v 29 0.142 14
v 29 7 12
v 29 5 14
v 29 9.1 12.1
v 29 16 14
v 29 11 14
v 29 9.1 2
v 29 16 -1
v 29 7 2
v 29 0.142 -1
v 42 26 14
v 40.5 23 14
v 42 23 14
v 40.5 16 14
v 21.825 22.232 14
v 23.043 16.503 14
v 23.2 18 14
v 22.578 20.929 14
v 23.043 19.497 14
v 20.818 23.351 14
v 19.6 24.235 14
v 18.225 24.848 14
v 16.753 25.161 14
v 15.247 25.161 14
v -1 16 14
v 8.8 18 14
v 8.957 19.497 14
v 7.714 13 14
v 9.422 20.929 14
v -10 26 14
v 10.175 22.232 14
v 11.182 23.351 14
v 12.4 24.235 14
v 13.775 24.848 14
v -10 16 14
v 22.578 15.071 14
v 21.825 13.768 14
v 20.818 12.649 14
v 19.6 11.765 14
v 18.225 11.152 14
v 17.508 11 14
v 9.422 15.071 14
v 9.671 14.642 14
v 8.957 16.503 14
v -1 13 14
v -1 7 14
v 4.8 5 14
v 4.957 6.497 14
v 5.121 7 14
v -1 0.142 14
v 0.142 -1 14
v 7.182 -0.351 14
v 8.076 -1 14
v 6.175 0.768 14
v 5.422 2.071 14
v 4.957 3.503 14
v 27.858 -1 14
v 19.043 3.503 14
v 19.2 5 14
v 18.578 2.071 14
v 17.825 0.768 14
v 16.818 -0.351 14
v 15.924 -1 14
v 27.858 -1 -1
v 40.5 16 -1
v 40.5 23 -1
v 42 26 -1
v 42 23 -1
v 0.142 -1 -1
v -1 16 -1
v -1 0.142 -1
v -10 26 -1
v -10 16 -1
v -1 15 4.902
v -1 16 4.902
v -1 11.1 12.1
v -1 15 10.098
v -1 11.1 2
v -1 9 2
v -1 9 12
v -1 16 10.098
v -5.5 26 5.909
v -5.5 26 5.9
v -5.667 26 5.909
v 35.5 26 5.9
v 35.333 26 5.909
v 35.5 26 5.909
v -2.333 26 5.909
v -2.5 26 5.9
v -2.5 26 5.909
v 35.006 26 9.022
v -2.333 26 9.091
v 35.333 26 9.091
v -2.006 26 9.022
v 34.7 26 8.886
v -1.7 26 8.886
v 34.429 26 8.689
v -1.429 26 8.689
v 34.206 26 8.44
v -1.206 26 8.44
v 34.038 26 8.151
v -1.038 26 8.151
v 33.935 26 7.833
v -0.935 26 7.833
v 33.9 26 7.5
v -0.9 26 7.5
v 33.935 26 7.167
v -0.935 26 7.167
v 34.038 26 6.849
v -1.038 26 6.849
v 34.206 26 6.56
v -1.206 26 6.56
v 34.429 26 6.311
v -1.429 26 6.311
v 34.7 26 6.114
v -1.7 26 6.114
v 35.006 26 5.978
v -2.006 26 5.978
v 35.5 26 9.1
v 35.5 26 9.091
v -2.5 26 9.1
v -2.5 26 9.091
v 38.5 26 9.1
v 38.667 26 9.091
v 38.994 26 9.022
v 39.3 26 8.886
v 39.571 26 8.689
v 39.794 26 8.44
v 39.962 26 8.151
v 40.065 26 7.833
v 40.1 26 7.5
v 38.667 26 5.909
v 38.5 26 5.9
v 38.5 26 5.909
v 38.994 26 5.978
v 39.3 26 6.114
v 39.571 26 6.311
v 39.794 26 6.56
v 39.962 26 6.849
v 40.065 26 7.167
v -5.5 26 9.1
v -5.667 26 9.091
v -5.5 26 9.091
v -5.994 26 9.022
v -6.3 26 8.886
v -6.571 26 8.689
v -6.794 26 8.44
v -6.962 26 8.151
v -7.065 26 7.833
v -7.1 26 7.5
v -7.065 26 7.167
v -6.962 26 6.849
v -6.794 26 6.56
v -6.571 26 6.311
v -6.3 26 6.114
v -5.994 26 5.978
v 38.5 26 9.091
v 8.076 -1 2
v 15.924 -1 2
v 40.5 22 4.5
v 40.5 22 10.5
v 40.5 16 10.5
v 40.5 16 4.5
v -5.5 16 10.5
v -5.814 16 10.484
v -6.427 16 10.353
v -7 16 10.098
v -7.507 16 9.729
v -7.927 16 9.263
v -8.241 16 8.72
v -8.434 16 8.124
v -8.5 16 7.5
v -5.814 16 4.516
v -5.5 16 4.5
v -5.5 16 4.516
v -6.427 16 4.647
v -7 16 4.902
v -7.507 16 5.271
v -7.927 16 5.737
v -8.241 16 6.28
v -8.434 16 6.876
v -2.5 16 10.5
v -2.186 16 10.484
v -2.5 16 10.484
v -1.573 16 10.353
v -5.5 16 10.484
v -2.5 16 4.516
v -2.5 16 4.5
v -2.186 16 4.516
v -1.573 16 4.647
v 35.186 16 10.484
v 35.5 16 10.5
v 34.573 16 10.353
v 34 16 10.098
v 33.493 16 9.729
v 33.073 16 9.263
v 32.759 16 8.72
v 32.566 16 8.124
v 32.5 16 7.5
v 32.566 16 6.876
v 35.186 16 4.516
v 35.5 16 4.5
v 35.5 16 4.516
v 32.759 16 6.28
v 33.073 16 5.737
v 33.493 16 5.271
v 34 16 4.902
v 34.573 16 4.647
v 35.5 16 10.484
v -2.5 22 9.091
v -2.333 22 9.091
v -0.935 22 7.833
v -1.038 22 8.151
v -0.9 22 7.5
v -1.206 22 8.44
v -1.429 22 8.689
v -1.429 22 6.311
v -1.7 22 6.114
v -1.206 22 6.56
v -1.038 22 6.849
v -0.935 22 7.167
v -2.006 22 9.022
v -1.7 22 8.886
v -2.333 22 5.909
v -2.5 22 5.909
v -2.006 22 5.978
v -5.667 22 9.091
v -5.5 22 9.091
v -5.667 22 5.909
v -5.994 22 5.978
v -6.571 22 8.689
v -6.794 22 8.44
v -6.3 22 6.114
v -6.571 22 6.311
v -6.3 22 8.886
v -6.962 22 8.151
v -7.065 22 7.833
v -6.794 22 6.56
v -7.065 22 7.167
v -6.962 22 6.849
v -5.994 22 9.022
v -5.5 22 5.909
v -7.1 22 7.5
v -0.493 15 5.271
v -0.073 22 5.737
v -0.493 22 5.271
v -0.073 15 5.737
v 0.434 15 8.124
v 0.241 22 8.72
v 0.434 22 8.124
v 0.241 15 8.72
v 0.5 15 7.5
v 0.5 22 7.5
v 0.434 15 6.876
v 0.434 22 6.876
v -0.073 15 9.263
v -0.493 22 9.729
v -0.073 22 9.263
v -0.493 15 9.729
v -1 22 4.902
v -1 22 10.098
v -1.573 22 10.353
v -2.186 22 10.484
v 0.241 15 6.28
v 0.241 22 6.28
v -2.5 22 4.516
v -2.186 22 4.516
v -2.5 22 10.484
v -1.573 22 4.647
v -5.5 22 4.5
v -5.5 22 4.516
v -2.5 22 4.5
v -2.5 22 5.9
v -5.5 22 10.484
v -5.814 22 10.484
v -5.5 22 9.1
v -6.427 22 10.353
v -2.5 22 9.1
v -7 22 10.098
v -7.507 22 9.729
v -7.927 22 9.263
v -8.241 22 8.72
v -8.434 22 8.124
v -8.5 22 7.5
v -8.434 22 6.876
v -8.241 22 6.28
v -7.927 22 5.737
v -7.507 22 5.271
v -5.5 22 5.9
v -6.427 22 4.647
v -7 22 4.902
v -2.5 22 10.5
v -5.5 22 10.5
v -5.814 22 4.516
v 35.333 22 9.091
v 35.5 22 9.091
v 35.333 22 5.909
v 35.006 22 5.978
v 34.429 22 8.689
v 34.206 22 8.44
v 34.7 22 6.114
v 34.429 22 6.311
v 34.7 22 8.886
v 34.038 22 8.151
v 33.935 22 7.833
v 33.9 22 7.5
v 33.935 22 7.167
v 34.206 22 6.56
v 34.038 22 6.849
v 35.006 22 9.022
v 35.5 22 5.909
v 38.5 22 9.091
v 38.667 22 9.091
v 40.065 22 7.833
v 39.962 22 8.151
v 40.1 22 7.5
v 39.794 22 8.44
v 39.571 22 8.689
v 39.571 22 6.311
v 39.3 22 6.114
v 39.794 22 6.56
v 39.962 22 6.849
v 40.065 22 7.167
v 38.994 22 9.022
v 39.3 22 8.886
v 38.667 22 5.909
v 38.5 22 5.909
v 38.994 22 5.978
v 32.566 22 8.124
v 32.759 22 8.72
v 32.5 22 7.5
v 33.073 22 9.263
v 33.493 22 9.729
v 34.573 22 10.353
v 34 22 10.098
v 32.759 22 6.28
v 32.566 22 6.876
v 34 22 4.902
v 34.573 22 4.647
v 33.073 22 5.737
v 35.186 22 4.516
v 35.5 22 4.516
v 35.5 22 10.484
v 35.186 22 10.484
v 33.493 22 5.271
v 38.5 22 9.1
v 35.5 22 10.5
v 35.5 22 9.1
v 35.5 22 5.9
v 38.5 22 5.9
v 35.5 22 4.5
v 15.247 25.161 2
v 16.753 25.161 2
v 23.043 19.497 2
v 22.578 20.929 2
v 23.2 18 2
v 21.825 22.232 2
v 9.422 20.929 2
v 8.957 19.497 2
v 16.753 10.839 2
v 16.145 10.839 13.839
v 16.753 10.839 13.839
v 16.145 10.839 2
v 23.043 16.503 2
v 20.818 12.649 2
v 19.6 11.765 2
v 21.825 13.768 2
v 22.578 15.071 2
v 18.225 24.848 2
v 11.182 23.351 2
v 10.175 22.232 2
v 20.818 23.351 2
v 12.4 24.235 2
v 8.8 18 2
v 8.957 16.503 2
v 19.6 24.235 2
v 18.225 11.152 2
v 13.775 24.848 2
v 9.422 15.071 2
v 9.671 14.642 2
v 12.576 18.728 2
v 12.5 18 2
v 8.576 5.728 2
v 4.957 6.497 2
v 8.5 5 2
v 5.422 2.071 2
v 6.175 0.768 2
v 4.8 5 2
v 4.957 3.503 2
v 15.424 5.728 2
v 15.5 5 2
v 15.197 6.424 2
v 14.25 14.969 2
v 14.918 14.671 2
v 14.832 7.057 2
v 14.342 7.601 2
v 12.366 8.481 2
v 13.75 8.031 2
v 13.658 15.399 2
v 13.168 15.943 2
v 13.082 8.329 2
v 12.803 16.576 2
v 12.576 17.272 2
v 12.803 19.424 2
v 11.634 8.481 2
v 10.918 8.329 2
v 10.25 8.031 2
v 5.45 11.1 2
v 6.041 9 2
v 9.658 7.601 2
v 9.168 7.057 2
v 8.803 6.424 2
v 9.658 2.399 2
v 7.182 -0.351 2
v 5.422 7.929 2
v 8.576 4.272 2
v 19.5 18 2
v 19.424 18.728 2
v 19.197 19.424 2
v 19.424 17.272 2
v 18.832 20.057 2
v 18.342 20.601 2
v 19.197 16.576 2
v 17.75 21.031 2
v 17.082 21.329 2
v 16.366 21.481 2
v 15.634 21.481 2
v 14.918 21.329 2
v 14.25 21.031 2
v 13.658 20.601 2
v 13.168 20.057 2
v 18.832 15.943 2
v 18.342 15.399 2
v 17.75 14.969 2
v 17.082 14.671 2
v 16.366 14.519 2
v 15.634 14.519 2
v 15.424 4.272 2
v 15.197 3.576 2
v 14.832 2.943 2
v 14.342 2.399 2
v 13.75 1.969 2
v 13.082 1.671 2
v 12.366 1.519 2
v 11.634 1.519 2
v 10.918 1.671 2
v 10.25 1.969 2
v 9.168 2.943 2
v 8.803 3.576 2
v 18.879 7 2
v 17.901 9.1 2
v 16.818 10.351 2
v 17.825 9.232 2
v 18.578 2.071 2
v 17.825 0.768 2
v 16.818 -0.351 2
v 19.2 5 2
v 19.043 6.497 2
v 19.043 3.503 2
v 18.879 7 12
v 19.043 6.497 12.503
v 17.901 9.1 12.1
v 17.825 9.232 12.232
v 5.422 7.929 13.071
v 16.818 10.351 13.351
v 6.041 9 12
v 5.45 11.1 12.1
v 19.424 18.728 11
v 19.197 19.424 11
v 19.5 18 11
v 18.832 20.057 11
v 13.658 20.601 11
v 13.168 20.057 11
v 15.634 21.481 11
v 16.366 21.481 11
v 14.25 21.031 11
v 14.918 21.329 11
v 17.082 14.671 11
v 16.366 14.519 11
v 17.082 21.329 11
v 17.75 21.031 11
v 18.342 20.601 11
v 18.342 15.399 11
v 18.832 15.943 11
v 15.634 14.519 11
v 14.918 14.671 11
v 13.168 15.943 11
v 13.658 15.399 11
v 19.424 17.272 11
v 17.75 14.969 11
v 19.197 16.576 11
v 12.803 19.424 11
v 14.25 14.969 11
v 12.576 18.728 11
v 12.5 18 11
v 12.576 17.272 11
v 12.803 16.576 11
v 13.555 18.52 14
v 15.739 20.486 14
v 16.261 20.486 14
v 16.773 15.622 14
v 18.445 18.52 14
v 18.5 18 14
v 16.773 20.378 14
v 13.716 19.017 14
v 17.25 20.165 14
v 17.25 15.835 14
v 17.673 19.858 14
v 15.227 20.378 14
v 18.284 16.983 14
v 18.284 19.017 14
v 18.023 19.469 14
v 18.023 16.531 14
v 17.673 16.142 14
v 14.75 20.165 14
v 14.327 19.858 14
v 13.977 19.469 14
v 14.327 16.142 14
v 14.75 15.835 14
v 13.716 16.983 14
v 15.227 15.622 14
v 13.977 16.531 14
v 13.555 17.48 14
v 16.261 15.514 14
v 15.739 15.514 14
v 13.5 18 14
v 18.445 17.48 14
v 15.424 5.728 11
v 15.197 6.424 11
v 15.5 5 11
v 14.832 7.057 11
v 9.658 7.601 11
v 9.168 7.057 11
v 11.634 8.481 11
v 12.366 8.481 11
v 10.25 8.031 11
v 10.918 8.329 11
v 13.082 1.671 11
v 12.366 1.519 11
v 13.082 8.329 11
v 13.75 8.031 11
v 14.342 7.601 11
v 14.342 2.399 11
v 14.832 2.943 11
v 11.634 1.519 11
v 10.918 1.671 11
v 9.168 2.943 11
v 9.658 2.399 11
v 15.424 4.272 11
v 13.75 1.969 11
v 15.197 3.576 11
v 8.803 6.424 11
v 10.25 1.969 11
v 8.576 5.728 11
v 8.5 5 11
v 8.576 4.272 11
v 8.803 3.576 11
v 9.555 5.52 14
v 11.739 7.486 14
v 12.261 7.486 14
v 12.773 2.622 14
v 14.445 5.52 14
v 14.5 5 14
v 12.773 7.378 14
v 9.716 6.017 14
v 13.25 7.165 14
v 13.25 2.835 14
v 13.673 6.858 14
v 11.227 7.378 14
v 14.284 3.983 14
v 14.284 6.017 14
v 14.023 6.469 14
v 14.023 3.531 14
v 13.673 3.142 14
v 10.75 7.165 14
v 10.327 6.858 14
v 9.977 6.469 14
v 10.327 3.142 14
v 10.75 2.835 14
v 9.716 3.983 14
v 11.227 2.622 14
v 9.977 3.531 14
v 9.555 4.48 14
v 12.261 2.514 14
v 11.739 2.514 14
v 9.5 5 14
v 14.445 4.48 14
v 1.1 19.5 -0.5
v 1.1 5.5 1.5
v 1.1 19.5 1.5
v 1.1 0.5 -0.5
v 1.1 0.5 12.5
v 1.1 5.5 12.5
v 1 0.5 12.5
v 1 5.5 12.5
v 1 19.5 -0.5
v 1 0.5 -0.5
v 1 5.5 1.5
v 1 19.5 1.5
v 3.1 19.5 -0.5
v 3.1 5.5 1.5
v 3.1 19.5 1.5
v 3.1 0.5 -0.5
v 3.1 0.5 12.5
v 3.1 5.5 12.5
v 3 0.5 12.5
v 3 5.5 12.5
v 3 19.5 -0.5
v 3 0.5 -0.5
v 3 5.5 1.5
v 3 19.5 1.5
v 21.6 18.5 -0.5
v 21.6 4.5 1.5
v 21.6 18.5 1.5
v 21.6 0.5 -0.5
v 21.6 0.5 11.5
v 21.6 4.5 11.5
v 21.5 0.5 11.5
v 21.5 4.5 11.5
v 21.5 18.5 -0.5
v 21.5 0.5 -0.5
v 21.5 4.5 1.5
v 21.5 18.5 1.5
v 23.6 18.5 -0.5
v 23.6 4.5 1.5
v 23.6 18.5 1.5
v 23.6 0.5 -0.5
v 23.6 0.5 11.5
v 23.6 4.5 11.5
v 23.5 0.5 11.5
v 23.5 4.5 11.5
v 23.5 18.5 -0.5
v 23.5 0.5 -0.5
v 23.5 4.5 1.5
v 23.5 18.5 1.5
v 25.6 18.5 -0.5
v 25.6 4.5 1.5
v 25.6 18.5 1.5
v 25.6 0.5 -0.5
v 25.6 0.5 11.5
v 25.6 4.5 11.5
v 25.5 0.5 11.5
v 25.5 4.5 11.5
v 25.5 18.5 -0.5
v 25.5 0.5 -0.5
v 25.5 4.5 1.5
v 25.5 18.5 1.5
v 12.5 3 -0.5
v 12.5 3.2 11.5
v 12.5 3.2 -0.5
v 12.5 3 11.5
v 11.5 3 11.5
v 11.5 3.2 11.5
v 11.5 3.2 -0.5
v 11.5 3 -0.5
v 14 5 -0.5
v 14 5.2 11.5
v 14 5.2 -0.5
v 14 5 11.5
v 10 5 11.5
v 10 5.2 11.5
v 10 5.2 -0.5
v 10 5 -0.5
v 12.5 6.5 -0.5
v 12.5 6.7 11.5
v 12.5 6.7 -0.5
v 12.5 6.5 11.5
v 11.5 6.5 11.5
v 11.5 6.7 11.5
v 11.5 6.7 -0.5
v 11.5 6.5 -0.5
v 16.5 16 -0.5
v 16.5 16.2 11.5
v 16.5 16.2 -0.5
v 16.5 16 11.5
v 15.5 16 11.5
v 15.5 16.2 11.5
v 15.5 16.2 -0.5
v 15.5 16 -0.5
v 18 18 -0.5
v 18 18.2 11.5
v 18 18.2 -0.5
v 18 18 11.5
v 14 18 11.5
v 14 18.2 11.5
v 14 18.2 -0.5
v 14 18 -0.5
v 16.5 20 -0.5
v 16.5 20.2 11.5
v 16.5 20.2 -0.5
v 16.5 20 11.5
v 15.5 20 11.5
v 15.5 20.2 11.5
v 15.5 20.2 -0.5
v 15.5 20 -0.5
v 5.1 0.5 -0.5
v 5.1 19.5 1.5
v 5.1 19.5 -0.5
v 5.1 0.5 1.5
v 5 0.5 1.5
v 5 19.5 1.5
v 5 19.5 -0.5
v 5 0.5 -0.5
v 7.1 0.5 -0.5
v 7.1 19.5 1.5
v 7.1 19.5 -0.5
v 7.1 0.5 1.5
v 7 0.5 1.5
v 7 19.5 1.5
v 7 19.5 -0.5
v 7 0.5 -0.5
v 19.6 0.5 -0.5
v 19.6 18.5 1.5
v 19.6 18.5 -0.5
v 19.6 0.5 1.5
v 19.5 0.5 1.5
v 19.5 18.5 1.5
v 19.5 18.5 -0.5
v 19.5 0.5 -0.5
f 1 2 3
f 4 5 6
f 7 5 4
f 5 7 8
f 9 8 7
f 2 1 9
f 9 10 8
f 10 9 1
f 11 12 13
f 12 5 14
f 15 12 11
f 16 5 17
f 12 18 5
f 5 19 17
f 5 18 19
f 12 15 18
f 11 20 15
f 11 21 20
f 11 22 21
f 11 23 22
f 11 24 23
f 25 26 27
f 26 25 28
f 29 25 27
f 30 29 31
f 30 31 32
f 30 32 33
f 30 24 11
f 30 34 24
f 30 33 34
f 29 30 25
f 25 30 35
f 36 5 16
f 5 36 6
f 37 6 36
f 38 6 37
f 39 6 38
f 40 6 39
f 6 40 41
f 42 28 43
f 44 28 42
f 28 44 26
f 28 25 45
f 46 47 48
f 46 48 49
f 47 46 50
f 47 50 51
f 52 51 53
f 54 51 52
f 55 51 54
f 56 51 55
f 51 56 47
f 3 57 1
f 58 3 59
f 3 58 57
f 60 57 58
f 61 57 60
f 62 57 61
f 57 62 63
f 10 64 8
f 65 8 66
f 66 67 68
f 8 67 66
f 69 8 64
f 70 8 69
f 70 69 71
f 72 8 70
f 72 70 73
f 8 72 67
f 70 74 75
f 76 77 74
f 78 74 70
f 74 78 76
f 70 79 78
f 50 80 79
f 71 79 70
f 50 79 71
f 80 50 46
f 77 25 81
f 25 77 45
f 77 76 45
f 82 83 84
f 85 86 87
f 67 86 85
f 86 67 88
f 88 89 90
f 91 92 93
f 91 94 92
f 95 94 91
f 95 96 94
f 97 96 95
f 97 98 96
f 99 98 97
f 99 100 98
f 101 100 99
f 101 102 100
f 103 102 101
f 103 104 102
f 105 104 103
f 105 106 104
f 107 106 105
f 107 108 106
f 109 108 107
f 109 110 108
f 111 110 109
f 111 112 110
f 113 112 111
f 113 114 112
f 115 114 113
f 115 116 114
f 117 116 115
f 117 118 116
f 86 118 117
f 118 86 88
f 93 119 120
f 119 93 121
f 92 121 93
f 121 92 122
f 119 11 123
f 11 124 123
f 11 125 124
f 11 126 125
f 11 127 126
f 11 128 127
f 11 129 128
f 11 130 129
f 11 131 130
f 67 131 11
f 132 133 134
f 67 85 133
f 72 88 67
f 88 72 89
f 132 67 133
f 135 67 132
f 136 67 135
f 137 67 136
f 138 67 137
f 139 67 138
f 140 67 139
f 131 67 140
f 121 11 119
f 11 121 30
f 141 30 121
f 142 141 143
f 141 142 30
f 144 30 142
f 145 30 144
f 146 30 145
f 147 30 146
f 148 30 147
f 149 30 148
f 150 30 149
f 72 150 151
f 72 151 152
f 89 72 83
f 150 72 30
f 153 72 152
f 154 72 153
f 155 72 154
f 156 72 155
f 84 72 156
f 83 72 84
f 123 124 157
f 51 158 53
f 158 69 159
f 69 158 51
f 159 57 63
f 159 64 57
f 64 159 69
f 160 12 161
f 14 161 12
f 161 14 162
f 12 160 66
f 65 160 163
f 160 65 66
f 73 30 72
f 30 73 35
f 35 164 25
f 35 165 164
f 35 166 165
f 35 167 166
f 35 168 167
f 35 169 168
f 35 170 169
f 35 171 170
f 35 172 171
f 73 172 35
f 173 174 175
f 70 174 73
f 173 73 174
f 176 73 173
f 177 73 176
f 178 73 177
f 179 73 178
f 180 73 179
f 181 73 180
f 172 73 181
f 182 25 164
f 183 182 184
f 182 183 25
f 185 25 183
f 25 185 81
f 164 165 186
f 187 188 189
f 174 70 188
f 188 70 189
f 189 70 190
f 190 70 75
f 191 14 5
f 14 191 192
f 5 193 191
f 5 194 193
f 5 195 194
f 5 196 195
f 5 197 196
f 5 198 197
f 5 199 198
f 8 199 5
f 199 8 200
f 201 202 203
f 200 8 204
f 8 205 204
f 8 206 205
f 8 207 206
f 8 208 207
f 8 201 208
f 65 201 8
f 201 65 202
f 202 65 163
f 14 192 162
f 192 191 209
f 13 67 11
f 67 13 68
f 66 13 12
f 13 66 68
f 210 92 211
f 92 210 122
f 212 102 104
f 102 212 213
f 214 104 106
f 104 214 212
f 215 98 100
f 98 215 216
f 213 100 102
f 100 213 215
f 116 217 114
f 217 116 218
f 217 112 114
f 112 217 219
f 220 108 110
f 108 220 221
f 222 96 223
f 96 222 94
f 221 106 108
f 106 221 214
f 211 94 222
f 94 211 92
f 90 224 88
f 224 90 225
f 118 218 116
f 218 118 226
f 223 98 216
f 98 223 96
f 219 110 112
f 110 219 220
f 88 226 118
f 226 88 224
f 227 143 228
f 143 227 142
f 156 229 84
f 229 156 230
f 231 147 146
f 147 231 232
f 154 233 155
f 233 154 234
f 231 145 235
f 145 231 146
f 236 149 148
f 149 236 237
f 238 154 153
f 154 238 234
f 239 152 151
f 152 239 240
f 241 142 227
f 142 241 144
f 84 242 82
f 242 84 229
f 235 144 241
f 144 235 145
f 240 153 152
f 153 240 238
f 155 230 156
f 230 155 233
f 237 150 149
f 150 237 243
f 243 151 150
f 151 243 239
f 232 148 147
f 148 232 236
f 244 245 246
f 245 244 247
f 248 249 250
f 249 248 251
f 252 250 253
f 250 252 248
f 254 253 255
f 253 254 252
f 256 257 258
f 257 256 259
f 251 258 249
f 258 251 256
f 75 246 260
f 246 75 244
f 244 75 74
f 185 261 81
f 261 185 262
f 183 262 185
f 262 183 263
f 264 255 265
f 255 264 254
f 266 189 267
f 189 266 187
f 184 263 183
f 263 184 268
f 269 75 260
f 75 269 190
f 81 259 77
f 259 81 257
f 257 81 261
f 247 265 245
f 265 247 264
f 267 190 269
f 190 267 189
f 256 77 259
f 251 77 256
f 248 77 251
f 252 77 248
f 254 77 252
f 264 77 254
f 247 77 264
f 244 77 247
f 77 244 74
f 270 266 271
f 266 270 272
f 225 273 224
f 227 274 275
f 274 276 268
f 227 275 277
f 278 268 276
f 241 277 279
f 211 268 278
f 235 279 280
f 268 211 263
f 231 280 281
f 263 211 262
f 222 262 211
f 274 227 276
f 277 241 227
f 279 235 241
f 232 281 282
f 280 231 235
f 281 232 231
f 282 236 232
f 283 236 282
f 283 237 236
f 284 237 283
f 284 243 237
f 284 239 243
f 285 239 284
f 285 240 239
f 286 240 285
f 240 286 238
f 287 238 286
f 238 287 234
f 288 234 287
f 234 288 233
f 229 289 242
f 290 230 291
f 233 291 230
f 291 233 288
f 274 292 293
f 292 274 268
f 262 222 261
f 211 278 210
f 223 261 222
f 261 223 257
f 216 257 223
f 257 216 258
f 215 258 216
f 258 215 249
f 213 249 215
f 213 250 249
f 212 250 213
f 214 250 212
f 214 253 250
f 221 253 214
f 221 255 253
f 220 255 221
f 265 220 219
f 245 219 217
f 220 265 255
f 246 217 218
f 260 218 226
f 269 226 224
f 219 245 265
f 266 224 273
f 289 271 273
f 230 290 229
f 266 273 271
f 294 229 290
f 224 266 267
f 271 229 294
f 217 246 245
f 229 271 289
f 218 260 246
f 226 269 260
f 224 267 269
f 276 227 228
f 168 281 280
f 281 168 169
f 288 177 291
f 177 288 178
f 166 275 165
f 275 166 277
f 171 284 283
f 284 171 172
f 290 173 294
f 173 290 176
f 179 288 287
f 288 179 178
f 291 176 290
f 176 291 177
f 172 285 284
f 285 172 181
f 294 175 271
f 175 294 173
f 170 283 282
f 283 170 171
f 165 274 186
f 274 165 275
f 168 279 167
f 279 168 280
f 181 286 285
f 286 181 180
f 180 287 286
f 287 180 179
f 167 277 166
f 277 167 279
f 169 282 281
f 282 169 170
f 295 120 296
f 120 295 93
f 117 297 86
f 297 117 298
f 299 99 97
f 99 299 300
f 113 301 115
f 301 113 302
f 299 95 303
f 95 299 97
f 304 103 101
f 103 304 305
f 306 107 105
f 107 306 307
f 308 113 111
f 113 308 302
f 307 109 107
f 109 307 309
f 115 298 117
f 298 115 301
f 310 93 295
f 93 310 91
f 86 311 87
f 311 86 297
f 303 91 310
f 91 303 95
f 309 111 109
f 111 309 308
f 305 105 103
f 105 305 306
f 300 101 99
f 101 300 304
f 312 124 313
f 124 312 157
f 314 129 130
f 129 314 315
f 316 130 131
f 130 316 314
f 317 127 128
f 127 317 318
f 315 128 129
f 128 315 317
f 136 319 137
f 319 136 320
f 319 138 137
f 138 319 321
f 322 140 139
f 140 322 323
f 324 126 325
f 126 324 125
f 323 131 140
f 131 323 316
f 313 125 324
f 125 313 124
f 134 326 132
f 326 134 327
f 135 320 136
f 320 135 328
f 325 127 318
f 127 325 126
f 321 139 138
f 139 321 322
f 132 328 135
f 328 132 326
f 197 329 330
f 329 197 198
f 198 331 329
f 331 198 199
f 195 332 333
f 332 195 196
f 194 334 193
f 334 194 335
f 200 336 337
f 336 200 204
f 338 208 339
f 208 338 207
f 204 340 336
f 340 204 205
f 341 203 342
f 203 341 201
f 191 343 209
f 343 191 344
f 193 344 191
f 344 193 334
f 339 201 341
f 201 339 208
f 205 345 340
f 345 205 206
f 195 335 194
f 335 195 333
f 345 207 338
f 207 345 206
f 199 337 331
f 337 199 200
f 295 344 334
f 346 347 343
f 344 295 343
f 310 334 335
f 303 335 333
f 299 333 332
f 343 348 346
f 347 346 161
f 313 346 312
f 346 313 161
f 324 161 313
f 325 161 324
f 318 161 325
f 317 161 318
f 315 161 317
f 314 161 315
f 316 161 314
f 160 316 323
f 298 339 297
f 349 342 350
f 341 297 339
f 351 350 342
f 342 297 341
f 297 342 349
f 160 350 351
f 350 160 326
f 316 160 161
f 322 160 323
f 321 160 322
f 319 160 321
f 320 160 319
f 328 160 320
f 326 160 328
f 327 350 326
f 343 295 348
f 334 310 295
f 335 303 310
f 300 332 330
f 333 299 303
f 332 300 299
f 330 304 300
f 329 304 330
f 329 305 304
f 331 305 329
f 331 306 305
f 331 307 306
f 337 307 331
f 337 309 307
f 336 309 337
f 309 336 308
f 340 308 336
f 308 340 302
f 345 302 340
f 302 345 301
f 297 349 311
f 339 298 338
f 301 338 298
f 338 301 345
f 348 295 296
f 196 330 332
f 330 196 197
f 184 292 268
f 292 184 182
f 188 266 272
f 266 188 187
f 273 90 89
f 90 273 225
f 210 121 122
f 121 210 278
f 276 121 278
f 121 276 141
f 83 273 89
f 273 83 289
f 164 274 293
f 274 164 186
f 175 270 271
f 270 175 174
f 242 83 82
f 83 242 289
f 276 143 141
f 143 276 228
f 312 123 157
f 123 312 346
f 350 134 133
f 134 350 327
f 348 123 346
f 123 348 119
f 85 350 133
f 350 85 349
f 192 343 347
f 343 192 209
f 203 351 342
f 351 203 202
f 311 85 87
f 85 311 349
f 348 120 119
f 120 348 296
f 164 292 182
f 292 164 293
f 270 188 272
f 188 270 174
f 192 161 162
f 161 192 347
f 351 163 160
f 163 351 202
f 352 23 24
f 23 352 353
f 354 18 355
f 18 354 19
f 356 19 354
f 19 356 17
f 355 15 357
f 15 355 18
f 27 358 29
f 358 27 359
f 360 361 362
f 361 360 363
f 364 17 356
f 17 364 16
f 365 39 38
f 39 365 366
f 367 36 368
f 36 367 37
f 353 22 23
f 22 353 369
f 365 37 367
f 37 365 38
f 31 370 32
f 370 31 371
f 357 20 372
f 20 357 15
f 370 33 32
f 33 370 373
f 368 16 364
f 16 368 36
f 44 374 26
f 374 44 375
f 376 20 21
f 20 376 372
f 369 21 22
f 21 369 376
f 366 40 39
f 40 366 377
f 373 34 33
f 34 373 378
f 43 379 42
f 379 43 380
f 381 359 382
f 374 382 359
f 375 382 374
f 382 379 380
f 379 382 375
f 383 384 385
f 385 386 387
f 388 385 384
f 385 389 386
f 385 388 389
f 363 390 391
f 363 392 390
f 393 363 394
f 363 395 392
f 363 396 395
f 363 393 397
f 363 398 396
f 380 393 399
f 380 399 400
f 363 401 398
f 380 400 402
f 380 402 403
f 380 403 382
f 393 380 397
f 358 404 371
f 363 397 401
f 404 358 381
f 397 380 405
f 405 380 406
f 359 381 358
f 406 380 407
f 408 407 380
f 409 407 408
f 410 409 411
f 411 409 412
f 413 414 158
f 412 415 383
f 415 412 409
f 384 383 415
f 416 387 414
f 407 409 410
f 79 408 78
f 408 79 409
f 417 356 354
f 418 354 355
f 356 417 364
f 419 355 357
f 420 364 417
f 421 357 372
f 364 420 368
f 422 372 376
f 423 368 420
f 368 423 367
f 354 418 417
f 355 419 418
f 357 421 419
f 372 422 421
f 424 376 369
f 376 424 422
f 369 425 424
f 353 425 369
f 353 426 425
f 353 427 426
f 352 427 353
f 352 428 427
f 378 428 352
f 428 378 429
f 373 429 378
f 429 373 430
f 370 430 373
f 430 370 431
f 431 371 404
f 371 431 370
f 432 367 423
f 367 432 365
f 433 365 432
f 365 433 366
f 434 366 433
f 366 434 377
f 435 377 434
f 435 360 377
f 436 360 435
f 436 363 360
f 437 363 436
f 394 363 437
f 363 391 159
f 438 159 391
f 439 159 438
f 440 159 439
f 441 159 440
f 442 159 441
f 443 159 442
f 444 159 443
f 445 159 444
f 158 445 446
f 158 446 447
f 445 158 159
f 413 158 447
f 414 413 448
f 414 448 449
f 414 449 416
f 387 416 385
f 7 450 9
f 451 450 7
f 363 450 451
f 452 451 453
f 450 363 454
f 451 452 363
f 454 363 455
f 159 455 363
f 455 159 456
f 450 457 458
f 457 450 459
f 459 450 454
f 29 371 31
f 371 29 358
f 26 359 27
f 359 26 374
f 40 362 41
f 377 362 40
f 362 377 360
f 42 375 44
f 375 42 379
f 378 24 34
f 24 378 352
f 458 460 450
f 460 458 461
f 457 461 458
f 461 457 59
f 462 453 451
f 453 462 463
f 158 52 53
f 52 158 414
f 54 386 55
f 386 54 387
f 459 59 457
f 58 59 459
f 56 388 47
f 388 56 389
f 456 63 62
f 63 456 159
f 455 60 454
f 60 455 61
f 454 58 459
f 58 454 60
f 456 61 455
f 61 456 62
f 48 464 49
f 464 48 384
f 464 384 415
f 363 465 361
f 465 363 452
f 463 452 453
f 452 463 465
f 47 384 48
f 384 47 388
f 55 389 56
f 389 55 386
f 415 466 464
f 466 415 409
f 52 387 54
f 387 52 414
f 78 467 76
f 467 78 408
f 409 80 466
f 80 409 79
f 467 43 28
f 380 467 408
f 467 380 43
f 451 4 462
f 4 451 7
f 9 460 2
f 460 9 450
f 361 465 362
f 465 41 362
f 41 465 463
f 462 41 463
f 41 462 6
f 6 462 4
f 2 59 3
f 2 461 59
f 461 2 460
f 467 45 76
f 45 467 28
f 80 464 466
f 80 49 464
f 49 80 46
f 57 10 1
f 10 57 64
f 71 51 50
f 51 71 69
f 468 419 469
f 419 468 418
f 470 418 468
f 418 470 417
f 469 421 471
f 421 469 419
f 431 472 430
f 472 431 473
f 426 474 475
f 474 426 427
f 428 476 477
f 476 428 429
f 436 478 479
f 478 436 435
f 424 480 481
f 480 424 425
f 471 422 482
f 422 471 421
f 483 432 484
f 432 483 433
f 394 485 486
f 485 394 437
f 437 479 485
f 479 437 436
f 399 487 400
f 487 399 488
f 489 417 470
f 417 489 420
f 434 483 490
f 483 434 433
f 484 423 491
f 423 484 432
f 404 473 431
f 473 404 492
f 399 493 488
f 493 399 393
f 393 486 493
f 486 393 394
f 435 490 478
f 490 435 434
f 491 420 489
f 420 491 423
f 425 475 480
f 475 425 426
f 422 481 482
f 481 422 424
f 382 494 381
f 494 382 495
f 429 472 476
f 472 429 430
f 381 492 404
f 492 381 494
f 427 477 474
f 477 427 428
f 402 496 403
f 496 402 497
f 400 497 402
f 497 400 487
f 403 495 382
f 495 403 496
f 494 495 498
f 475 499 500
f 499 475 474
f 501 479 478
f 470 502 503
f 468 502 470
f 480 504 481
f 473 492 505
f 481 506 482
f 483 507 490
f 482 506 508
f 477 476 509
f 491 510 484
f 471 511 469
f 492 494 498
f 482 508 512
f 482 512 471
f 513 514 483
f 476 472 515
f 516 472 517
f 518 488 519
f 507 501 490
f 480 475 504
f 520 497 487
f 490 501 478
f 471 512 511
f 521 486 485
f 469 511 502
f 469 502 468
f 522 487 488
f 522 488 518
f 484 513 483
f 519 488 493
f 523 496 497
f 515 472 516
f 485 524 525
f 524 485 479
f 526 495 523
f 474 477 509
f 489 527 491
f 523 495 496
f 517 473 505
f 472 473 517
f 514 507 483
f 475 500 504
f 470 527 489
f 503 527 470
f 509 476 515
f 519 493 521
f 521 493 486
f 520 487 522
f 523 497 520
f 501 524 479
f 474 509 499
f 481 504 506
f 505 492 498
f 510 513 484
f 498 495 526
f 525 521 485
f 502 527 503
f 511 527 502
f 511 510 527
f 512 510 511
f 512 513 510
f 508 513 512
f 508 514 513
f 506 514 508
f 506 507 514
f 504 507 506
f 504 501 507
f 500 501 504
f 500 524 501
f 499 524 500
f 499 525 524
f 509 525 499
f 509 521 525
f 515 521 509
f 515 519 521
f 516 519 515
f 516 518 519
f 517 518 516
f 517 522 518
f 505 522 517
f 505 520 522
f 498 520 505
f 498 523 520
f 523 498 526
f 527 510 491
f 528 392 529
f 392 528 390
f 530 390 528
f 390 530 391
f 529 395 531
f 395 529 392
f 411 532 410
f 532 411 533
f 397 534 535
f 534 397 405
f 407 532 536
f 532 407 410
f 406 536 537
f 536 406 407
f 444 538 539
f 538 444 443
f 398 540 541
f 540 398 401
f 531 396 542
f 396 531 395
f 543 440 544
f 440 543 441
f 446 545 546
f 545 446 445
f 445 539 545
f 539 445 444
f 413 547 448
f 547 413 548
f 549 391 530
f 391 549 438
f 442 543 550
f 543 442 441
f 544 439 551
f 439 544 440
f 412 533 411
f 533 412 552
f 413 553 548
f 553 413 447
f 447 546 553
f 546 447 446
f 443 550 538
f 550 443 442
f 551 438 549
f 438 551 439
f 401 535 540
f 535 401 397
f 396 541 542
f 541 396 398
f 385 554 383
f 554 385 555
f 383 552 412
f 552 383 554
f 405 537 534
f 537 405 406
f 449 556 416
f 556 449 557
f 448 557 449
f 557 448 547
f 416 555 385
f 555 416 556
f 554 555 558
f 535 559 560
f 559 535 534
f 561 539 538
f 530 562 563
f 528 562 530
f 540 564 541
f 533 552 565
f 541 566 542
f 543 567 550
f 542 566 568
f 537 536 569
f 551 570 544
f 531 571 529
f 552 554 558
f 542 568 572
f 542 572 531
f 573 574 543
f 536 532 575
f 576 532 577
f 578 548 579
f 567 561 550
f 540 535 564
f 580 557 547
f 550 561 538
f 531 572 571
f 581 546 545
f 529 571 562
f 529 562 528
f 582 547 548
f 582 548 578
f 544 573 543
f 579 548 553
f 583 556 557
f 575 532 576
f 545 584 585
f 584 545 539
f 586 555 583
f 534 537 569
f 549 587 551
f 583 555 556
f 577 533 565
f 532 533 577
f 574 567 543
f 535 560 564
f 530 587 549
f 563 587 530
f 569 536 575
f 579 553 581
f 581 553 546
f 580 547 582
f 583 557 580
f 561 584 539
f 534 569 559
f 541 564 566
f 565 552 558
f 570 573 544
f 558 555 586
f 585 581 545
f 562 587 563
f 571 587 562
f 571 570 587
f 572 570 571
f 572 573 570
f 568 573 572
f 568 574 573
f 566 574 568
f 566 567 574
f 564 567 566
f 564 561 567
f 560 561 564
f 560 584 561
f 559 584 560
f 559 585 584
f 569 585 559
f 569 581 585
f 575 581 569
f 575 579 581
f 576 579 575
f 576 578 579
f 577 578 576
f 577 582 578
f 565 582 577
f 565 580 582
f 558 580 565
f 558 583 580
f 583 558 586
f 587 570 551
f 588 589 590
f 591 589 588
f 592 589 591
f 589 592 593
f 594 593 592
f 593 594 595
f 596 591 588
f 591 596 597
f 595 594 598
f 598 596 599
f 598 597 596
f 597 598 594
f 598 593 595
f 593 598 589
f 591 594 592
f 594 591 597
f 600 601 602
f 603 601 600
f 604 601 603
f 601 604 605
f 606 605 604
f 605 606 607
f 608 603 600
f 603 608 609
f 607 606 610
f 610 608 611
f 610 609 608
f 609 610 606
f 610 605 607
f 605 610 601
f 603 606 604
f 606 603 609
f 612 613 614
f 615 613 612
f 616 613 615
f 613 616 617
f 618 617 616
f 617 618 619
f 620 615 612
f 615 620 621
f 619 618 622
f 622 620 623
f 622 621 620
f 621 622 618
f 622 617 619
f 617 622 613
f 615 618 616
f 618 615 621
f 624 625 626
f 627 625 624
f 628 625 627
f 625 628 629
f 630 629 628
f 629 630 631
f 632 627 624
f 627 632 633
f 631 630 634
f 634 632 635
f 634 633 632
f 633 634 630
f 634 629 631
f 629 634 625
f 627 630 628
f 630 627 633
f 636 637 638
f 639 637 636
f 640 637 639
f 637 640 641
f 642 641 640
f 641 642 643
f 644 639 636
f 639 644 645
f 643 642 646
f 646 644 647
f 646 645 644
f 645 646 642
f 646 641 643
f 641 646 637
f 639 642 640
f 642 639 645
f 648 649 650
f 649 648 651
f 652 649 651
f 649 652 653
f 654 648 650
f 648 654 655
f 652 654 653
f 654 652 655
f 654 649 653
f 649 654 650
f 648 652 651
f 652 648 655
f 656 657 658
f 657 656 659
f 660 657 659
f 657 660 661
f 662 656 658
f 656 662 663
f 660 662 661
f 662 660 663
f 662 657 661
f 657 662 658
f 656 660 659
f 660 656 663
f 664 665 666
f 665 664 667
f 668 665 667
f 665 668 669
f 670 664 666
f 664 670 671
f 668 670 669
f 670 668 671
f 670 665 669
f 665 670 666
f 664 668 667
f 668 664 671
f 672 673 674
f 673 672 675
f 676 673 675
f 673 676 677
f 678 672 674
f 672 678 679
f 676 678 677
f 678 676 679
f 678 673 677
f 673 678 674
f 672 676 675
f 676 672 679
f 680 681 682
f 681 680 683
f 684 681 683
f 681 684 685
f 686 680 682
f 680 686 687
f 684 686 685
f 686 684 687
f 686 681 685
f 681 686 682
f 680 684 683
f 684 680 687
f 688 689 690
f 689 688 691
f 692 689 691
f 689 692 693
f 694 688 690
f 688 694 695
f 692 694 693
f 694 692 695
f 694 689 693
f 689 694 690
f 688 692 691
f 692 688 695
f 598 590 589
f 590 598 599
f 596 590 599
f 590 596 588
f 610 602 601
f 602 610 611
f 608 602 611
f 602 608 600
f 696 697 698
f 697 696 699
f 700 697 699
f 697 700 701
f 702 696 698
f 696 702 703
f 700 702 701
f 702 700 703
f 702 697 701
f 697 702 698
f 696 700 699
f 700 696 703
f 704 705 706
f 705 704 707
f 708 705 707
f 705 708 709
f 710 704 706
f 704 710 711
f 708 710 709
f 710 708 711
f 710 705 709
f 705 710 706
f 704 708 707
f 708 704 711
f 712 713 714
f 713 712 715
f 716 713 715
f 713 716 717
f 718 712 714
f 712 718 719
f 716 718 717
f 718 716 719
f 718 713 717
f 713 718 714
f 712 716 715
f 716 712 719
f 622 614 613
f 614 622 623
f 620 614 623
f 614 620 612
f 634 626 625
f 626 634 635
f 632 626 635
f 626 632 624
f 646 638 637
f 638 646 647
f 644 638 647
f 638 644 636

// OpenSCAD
// PRUSA iteration3
// Y belt holder
// GNU GPL v3
// Josef Průša <iam@josefprusa.cz> and contributors
// http://www.reprap.org/wiki/Prusa_Mendel
// http://prusamendel.org

module main_body()
{
translate([-1, -1, -1 ]) cube([ 30, 27, 15 ]);
translate([-10, 16, -1 ]) cube([ 50.5, 10, 15 ]);
translate([-10, 23, -1 ]) cube([ 52, 3, 15 ]);
}

module belt_holders()
{
   translate([ 16, 18, 0 ]) cylinder( h=11, r=3.5, $fn=30 );  // upper belt holder
   translate([ 16, 18, 11 ]) cylinder( h=3, r1=3.5, r2=2.5, $fn=30 );  // upper belt holder cone
    
   translate([ 12, 5, 0 ]) cylinder( h=11, r=3.5, $fn=30 );  // lower belt holder
   translate([ 12, 5, 11 ]) cylinder( h=3 , r1=3.5, r2=2.5, $fn=30 );  // lower belt holder cone
}

module screws()
{
    translate( [ -2.5 , 28 , 7.5 ] ) rotate([90,0,0]) cylinder( h = 10, r = 1.6, $fn=30);  //screw hole
    translate( [ -5.5 , 28 , 7.5 ] ) rotate([90,0,0]) cylinder( h = 10, r = 1.6, $fn=30);  //screw hole
    translate( [ -2.5, 22 , 7.5 ] ) rotate([90,0,0]) cylinder( h = 7, r = 3, $fn=30);  //screw hole - head
    translate( [ -5.5 , 22 , 7.5 ] ) rotate([90,0,0]) cylinder( h = 10, r = 3, $fn=30);  //screw hole - head
    
    translate( [ 35.5 , 28 , 7.5 ] ) rotate([90,0,0]) cylinder( h = 10, r = 1.6, $fn=30);  //screw hole
    translate( [ 38.5 , 28 , 7.5 ] ) rotate([90,0,0]) cylinder( h = 10, r = 1.6, $fn=30);  //screw hole
    translate( [ 35.5 , 22 , 7.5 ] ) rotate([90,0,0]) cylinder( h = 10, r = 3, $fn=30);  //screw hole - head
    translate( [ 38.5 , 22 , 7.5 ] ) rotate([90,0,0]) cylinder( h = 10, r = 3, $fn=30);  //screw hole - head
    
    translate([-5.5, 21, 5.9 ]) cube([ 3, 6, 3.2 ]);
    translate([35.5, 21, 5.9 ]) cube([ 3, 6, 3.2 ]);
    
    translate([-5.5, 15, 4.5 ]) cube([ 3, 7, 6 ]);
    translate([35.5, 15, 4.5 ]) cube([ 6, 7, 6 ]);
}

//belt_holders();
module main()

{
difference()
{
main_body();
    
translate([ 16, 18, 2 ]) cylinder( h = 16, r = 7.2, $fn=30 );  // upper belt space cutaway
translate([ 12, 5, 2 ]) cylinder( h = 16, r = 7.2, $fn=30 );  // lower belt space cutaway
translate([-20, 9, 2]) cube([ 28, 2.1, 16 ]); 
rotate([0,0,40]) translate([11, 1, 2 ]) cube([ 10, 4, 16 ]);     
    
translate([10, 7, 2 ]) cube([ 32, 2.1, 16 ]); 
    
translate([16, 8, 11 ]) rotate([45,0,0]) cube([ 15, 5, 5 ]);     
translate([-2, 10, 11 ]) rotate([45,0,0]) cube([ 10, 5, 5 ]);     
screws();
    
 
 
 
    // corner cutoff
    translate([30,-13,-2]) rotate([0,0,45]) cube([10,10,20]);    
    translate([-2,-13,-2]) rotate([0,0,45]) cube([10,10,20]);    
    
    
}
}

module selective_infill()
{
    // print part reinforcement
    translate([1,    0.5, -0.5]) cube([0.1,5,13]);     
    translate([3,    0.5, -0.5]) cube([0.1,5,13]);     
    translate([21.5, 0.5, -0.5]) cube([0.1,4,12]);
    translate([23.5, 0.5, -0.5]) cube([0.1,4,12]);
    translate([25.5, 0.5, -0.5]) cube([0.1,4,12]);
    translate([11.5, 3,   -0.5]) cube([1,0.2,12]);
    translate([10,   5,   -0.5]) cube([4,0.2,12]);
    translate([11.5, 6.5, -0.5]) cube([1,0.2,12]);
    translate([15.5, 16,  -0.5]) cube([1,0.2,12]);
    translate([14,   18,  -0.5]) cube([4,0.2,12]);
    translate([15.5, 20,  -0.5]) cube([1,0.2,12]);   
   
    translate([1, 5.5, -0.5]) cube([0.1,14,2]);    
    translate([3, 5.5, -0.5]) cube([0.1,14,2]);   
    translate([5, 0.5, -0.5]) cube([0.1,19,2]);   
    translate([7, 0.5, -0.5]) cube([0.1,19,2]);   
    
    translate([19.5, 0.5, -0.5]) cube([0.1,18,2]);
    translate([21.5, 4.5, -0.5]) cube([0.1,14,2]);
    translate([23.5, 4.5, -0.5]) cube([0.1,14,2]);
    translate([25.5, 4.5, -0.5]) cube([0.1,14,2]);
    }
    
    
module final_part()
{
difference()
    {
    union()
    {
    main();
    belt_holders();  
    }
    selective_infill();
}
}    
   
final_part();

   
